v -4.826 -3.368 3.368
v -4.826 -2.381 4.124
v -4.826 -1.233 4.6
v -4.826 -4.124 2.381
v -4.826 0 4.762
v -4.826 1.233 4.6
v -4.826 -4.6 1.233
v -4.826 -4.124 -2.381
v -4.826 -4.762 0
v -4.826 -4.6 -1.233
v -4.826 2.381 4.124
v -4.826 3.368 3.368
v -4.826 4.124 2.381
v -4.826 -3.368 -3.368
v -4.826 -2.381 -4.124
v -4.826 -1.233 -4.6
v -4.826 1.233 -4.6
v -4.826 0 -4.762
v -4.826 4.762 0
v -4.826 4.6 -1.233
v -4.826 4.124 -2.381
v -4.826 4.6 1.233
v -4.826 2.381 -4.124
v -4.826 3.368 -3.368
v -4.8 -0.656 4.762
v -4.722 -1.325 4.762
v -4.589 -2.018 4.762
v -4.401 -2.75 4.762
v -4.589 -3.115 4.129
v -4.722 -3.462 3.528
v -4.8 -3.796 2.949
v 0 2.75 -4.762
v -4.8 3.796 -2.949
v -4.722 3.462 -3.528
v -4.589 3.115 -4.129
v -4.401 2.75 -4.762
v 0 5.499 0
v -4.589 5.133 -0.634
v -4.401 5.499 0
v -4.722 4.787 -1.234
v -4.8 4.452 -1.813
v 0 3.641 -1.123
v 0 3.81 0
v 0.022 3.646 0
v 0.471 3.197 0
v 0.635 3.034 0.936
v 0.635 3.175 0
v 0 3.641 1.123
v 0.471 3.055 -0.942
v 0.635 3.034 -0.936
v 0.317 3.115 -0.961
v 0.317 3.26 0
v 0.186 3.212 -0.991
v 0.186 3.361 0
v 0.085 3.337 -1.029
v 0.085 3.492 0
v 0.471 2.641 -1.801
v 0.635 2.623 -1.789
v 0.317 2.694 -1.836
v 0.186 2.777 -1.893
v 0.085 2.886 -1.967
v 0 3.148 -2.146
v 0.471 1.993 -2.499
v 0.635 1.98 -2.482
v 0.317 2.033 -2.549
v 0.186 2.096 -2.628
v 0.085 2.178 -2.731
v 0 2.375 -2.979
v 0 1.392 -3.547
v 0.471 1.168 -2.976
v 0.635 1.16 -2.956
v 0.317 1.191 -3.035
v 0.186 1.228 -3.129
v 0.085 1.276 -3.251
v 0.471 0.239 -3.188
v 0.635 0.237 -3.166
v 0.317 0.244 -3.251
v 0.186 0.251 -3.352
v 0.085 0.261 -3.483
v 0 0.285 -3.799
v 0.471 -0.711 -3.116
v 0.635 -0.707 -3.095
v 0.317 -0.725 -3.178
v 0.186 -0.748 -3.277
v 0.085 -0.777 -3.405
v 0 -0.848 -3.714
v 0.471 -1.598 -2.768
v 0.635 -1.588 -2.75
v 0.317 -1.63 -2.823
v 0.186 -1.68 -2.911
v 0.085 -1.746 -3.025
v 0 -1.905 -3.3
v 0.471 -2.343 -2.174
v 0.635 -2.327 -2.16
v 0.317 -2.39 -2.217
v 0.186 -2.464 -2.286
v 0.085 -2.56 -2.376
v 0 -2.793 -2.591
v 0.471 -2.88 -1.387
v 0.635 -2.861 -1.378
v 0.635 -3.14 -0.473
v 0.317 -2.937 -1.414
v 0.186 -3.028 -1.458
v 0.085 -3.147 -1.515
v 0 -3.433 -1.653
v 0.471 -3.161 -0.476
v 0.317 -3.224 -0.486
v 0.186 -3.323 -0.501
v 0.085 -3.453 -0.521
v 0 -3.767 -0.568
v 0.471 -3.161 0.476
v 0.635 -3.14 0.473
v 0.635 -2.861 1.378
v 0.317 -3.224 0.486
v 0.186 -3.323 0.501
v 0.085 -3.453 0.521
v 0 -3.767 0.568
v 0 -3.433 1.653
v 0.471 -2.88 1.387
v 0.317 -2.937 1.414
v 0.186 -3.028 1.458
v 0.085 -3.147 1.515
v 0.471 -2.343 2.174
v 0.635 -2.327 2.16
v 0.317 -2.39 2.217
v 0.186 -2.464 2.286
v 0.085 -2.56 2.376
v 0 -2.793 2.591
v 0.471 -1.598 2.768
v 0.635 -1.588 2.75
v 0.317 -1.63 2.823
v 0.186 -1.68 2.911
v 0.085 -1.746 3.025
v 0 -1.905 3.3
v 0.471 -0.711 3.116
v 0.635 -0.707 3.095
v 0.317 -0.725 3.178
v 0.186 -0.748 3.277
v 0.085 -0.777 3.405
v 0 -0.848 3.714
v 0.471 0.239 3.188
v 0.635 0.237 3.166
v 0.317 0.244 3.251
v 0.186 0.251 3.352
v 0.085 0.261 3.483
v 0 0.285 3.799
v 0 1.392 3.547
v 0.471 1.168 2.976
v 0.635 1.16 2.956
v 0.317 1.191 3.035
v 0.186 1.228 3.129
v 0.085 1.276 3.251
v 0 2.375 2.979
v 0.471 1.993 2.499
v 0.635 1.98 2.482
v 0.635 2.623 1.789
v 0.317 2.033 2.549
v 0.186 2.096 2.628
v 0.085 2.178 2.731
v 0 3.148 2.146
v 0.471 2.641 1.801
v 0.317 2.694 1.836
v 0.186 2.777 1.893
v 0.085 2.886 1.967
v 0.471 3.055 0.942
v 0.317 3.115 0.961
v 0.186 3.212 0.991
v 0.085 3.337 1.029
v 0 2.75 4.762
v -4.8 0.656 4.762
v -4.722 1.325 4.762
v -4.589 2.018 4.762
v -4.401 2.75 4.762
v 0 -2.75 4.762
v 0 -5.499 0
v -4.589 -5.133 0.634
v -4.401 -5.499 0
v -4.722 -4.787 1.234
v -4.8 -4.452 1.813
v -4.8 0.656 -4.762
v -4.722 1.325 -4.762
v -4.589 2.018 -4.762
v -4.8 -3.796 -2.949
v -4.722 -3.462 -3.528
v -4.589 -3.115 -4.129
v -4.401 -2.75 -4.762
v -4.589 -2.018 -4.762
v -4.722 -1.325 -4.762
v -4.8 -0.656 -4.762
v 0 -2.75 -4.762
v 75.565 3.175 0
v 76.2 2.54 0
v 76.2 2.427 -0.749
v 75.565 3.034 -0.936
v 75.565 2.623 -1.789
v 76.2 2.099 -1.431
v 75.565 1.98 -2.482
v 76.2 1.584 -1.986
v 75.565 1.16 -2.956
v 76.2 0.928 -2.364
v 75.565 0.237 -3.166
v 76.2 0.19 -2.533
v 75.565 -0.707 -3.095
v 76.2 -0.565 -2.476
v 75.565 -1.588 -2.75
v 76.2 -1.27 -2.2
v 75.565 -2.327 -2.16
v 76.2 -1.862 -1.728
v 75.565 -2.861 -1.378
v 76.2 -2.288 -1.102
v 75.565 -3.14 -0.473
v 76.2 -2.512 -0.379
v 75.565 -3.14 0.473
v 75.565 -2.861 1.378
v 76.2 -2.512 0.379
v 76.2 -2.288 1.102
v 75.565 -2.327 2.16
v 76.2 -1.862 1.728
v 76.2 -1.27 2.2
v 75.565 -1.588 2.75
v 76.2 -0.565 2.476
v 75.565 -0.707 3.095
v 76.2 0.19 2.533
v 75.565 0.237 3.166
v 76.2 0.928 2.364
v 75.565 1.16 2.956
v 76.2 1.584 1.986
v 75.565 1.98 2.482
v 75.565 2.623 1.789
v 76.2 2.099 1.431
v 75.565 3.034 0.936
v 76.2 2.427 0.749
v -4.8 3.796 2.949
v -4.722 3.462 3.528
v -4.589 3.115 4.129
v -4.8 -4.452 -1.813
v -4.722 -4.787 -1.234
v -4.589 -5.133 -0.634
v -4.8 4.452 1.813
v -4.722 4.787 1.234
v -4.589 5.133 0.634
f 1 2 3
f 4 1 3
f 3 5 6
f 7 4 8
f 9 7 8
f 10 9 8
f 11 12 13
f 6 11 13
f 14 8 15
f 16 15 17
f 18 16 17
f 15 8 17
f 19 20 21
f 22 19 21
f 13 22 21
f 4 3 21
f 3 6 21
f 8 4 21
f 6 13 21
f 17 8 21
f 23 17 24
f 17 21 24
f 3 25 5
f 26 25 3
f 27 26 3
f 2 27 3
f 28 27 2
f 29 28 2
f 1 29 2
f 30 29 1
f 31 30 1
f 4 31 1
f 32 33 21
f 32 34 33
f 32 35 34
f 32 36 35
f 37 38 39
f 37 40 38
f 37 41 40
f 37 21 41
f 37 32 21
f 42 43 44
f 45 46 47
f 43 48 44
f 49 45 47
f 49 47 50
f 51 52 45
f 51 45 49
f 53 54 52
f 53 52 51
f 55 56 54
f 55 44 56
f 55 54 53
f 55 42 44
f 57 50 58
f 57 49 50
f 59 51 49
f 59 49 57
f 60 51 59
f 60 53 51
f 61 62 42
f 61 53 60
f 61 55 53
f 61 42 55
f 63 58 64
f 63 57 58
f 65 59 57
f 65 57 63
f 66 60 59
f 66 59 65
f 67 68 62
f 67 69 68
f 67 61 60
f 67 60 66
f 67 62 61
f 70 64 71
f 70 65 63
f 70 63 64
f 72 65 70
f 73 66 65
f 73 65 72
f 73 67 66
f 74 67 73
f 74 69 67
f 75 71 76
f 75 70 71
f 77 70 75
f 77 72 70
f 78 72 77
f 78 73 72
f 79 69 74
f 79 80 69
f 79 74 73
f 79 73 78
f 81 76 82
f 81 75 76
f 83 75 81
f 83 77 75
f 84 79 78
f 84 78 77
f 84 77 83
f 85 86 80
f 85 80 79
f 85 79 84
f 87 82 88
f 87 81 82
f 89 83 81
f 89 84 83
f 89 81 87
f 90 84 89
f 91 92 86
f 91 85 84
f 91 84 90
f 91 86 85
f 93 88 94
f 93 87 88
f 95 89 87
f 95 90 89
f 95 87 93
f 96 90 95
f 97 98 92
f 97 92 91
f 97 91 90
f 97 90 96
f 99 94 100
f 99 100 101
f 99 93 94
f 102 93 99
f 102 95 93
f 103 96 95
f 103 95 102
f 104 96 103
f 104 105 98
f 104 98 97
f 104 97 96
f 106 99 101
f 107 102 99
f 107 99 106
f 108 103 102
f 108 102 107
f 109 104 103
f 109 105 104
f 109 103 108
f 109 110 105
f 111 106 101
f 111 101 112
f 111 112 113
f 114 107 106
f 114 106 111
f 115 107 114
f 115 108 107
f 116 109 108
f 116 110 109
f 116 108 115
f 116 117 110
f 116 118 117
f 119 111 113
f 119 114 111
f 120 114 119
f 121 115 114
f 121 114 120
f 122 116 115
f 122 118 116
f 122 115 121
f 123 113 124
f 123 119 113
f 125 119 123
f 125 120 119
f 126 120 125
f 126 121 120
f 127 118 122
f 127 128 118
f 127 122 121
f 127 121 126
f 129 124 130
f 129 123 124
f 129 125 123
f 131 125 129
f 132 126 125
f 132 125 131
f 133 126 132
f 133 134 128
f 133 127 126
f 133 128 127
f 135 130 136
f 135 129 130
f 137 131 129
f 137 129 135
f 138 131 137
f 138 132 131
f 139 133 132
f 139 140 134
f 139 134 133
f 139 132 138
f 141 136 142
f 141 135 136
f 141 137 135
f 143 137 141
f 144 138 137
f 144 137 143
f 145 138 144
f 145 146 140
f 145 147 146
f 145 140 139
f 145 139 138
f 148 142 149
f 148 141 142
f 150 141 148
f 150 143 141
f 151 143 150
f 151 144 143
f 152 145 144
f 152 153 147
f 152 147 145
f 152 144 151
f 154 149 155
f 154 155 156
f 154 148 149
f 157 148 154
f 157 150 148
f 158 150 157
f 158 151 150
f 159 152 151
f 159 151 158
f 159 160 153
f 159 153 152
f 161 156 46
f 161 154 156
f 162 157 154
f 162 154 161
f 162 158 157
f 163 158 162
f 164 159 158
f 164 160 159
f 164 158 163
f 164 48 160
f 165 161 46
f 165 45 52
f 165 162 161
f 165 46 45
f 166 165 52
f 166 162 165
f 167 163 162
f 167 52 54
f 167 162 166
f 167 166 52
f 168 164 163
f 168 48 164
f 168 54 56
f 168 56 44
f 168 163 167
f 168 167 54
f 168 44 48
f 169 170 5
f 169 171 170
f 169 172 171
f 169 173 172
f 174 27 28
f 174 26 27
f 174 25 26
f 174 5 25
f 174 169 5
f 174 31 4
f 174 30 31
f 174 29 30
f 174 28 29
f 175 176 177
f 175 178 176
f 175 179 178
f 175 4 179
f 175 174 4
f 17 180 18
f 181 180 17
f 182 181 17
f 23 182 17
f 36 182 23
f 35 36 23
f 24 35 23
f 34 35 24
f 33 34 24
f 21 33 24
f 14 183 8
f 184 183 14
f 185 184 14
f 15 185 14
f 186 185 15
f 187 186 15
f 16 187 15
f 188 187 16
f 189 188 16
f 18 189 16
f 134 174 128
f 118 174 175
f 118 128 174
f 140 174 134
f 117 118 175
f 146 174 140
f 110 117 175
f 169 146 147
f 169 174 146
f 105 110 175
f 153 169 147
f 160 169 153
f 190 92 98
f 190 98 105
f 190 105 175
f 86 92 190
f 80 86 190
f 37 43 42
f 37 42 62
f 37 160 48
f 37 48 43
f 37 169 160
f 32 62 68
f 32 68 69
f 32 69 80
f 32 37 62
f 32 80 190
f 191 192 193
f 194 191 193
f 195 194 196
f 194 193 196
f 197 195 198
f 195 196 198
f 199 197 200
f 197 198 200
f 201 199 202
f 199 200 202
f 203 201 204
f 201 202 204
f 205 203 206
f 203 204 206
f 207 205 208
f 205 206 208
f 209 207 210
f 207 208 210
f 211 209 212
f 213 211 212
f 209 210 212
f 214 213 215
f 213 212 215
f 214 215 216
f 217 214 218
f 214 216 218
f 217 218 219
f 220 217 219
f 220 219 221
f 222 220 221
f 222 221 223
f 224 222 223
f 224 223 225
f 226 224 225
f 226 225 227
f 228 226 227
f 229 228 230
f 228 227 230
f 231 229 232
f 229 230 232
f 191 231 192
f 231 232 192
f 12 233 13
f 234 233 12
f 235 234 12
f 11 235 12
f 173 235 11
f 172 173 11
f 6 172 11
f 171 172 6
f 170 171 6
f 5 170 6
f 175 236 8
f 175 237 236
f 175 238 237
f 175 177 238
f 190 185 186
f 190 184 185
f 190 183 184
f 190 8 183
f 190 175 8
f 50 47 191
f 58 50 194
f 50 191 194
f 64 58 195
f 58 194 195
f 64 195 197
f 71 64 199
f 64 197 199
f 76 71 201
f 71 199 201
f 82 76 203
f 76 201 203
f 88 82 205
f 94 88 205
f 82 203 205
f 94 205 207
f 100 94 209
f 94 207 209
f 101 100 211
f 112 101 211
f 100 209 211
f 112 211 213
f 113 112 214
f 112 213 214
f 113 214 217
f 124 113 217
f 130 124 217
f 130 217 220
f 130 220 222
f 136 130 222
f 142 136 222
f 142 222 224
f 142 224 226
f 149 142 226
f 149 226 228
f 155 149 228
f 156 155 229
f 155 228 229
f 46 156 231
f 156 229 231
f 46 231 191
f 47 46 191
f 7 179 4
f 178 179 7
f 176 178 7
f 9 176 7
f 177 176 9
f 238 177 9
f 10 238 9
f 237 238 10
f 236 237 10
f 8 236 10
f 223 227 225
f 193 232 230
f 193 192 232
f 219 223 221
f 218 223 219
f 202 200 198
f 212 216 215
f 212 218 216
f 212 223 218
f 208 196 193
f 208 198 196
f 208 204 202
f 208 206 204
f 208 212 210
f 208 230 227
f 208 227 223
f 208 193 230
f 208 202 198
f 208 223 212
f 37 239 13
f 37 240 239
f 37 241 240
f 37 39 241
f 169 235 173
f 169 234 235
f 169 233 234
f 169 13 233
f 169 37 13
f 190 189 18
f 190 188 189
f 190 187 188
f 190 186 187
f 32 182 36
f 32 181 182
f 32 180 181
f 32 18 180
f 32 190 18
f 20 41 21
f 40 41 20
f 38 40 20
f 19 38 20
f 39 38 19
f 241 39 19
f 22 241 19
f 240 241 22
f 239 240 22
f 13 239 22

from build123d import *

# Parameters (mm, degrees)
SKETCH1_W      = 76.2
SKETCH1_H      = 3.175
HEAD_DEPTH     = 4.826
CHAMFER2_SIZE  = 0.635
CHAMFER2_SIZE2 = 0.6351
FILLET_2_R     = 0.635


with BuildPart() as part:
    # Sketch1 → Body (revolve)
    with BuildSketch(Plane.XY):
        with Locations((38.1, 1.5875)):
            Rectangle(SKETCH1_W, SKETCH1_H)
    revolve(axis=Axis((76.2, 0, 0), (-1, 0, 0)))

    # Sketch2 → Head (add)
    with BuildSketch(Plane.ZY):
        Polygon((0, 5.499261314), (4.7625, 2.749630657), (4.7625, -2.749630657), (0, -5.499261314), (-4.7625, -2.749630657), (-4.7625, 2.749630657), align=None)
    extrude(amount=HEAD_DEPTH)

    # Sketch3 → Thread (revolve, cut)
    with BuildSketch(Plane.XY):
        Polygon((-4.826, 4.7625), (-4.276073869, 5.715), (-4.826, 5.715), align=None)
    revolve(axis=Axis((-1.1, 0, 0), (1, 0, 0)), mode=Mode.SUBTRACT)

    # Chamfer2
    chamfer2_edges = [part.edges().sort_by_distance(p)[0] for p in [
        (76.2, -3.175, 0),
    ]]
    chamfer2_side = [part.faces().sort_by_distance(p)[0] for p in [
        (38.1, -3.175, 0),
    ]]
    chamfer(chamfer2_edges, length=CHAMFER2_SIZE, length2=CHAMFER2_SIZE2, reference=chamfer2_side[0])

    # Fillet 2
    fillet_2_edges = [part.edges().sort_by_distance(p)[0] for p in [
        (0, -3.175, 0),
    ]]
    fillet(fillet_2_edges, radius=FILLET_2_R)


solid = part.part
